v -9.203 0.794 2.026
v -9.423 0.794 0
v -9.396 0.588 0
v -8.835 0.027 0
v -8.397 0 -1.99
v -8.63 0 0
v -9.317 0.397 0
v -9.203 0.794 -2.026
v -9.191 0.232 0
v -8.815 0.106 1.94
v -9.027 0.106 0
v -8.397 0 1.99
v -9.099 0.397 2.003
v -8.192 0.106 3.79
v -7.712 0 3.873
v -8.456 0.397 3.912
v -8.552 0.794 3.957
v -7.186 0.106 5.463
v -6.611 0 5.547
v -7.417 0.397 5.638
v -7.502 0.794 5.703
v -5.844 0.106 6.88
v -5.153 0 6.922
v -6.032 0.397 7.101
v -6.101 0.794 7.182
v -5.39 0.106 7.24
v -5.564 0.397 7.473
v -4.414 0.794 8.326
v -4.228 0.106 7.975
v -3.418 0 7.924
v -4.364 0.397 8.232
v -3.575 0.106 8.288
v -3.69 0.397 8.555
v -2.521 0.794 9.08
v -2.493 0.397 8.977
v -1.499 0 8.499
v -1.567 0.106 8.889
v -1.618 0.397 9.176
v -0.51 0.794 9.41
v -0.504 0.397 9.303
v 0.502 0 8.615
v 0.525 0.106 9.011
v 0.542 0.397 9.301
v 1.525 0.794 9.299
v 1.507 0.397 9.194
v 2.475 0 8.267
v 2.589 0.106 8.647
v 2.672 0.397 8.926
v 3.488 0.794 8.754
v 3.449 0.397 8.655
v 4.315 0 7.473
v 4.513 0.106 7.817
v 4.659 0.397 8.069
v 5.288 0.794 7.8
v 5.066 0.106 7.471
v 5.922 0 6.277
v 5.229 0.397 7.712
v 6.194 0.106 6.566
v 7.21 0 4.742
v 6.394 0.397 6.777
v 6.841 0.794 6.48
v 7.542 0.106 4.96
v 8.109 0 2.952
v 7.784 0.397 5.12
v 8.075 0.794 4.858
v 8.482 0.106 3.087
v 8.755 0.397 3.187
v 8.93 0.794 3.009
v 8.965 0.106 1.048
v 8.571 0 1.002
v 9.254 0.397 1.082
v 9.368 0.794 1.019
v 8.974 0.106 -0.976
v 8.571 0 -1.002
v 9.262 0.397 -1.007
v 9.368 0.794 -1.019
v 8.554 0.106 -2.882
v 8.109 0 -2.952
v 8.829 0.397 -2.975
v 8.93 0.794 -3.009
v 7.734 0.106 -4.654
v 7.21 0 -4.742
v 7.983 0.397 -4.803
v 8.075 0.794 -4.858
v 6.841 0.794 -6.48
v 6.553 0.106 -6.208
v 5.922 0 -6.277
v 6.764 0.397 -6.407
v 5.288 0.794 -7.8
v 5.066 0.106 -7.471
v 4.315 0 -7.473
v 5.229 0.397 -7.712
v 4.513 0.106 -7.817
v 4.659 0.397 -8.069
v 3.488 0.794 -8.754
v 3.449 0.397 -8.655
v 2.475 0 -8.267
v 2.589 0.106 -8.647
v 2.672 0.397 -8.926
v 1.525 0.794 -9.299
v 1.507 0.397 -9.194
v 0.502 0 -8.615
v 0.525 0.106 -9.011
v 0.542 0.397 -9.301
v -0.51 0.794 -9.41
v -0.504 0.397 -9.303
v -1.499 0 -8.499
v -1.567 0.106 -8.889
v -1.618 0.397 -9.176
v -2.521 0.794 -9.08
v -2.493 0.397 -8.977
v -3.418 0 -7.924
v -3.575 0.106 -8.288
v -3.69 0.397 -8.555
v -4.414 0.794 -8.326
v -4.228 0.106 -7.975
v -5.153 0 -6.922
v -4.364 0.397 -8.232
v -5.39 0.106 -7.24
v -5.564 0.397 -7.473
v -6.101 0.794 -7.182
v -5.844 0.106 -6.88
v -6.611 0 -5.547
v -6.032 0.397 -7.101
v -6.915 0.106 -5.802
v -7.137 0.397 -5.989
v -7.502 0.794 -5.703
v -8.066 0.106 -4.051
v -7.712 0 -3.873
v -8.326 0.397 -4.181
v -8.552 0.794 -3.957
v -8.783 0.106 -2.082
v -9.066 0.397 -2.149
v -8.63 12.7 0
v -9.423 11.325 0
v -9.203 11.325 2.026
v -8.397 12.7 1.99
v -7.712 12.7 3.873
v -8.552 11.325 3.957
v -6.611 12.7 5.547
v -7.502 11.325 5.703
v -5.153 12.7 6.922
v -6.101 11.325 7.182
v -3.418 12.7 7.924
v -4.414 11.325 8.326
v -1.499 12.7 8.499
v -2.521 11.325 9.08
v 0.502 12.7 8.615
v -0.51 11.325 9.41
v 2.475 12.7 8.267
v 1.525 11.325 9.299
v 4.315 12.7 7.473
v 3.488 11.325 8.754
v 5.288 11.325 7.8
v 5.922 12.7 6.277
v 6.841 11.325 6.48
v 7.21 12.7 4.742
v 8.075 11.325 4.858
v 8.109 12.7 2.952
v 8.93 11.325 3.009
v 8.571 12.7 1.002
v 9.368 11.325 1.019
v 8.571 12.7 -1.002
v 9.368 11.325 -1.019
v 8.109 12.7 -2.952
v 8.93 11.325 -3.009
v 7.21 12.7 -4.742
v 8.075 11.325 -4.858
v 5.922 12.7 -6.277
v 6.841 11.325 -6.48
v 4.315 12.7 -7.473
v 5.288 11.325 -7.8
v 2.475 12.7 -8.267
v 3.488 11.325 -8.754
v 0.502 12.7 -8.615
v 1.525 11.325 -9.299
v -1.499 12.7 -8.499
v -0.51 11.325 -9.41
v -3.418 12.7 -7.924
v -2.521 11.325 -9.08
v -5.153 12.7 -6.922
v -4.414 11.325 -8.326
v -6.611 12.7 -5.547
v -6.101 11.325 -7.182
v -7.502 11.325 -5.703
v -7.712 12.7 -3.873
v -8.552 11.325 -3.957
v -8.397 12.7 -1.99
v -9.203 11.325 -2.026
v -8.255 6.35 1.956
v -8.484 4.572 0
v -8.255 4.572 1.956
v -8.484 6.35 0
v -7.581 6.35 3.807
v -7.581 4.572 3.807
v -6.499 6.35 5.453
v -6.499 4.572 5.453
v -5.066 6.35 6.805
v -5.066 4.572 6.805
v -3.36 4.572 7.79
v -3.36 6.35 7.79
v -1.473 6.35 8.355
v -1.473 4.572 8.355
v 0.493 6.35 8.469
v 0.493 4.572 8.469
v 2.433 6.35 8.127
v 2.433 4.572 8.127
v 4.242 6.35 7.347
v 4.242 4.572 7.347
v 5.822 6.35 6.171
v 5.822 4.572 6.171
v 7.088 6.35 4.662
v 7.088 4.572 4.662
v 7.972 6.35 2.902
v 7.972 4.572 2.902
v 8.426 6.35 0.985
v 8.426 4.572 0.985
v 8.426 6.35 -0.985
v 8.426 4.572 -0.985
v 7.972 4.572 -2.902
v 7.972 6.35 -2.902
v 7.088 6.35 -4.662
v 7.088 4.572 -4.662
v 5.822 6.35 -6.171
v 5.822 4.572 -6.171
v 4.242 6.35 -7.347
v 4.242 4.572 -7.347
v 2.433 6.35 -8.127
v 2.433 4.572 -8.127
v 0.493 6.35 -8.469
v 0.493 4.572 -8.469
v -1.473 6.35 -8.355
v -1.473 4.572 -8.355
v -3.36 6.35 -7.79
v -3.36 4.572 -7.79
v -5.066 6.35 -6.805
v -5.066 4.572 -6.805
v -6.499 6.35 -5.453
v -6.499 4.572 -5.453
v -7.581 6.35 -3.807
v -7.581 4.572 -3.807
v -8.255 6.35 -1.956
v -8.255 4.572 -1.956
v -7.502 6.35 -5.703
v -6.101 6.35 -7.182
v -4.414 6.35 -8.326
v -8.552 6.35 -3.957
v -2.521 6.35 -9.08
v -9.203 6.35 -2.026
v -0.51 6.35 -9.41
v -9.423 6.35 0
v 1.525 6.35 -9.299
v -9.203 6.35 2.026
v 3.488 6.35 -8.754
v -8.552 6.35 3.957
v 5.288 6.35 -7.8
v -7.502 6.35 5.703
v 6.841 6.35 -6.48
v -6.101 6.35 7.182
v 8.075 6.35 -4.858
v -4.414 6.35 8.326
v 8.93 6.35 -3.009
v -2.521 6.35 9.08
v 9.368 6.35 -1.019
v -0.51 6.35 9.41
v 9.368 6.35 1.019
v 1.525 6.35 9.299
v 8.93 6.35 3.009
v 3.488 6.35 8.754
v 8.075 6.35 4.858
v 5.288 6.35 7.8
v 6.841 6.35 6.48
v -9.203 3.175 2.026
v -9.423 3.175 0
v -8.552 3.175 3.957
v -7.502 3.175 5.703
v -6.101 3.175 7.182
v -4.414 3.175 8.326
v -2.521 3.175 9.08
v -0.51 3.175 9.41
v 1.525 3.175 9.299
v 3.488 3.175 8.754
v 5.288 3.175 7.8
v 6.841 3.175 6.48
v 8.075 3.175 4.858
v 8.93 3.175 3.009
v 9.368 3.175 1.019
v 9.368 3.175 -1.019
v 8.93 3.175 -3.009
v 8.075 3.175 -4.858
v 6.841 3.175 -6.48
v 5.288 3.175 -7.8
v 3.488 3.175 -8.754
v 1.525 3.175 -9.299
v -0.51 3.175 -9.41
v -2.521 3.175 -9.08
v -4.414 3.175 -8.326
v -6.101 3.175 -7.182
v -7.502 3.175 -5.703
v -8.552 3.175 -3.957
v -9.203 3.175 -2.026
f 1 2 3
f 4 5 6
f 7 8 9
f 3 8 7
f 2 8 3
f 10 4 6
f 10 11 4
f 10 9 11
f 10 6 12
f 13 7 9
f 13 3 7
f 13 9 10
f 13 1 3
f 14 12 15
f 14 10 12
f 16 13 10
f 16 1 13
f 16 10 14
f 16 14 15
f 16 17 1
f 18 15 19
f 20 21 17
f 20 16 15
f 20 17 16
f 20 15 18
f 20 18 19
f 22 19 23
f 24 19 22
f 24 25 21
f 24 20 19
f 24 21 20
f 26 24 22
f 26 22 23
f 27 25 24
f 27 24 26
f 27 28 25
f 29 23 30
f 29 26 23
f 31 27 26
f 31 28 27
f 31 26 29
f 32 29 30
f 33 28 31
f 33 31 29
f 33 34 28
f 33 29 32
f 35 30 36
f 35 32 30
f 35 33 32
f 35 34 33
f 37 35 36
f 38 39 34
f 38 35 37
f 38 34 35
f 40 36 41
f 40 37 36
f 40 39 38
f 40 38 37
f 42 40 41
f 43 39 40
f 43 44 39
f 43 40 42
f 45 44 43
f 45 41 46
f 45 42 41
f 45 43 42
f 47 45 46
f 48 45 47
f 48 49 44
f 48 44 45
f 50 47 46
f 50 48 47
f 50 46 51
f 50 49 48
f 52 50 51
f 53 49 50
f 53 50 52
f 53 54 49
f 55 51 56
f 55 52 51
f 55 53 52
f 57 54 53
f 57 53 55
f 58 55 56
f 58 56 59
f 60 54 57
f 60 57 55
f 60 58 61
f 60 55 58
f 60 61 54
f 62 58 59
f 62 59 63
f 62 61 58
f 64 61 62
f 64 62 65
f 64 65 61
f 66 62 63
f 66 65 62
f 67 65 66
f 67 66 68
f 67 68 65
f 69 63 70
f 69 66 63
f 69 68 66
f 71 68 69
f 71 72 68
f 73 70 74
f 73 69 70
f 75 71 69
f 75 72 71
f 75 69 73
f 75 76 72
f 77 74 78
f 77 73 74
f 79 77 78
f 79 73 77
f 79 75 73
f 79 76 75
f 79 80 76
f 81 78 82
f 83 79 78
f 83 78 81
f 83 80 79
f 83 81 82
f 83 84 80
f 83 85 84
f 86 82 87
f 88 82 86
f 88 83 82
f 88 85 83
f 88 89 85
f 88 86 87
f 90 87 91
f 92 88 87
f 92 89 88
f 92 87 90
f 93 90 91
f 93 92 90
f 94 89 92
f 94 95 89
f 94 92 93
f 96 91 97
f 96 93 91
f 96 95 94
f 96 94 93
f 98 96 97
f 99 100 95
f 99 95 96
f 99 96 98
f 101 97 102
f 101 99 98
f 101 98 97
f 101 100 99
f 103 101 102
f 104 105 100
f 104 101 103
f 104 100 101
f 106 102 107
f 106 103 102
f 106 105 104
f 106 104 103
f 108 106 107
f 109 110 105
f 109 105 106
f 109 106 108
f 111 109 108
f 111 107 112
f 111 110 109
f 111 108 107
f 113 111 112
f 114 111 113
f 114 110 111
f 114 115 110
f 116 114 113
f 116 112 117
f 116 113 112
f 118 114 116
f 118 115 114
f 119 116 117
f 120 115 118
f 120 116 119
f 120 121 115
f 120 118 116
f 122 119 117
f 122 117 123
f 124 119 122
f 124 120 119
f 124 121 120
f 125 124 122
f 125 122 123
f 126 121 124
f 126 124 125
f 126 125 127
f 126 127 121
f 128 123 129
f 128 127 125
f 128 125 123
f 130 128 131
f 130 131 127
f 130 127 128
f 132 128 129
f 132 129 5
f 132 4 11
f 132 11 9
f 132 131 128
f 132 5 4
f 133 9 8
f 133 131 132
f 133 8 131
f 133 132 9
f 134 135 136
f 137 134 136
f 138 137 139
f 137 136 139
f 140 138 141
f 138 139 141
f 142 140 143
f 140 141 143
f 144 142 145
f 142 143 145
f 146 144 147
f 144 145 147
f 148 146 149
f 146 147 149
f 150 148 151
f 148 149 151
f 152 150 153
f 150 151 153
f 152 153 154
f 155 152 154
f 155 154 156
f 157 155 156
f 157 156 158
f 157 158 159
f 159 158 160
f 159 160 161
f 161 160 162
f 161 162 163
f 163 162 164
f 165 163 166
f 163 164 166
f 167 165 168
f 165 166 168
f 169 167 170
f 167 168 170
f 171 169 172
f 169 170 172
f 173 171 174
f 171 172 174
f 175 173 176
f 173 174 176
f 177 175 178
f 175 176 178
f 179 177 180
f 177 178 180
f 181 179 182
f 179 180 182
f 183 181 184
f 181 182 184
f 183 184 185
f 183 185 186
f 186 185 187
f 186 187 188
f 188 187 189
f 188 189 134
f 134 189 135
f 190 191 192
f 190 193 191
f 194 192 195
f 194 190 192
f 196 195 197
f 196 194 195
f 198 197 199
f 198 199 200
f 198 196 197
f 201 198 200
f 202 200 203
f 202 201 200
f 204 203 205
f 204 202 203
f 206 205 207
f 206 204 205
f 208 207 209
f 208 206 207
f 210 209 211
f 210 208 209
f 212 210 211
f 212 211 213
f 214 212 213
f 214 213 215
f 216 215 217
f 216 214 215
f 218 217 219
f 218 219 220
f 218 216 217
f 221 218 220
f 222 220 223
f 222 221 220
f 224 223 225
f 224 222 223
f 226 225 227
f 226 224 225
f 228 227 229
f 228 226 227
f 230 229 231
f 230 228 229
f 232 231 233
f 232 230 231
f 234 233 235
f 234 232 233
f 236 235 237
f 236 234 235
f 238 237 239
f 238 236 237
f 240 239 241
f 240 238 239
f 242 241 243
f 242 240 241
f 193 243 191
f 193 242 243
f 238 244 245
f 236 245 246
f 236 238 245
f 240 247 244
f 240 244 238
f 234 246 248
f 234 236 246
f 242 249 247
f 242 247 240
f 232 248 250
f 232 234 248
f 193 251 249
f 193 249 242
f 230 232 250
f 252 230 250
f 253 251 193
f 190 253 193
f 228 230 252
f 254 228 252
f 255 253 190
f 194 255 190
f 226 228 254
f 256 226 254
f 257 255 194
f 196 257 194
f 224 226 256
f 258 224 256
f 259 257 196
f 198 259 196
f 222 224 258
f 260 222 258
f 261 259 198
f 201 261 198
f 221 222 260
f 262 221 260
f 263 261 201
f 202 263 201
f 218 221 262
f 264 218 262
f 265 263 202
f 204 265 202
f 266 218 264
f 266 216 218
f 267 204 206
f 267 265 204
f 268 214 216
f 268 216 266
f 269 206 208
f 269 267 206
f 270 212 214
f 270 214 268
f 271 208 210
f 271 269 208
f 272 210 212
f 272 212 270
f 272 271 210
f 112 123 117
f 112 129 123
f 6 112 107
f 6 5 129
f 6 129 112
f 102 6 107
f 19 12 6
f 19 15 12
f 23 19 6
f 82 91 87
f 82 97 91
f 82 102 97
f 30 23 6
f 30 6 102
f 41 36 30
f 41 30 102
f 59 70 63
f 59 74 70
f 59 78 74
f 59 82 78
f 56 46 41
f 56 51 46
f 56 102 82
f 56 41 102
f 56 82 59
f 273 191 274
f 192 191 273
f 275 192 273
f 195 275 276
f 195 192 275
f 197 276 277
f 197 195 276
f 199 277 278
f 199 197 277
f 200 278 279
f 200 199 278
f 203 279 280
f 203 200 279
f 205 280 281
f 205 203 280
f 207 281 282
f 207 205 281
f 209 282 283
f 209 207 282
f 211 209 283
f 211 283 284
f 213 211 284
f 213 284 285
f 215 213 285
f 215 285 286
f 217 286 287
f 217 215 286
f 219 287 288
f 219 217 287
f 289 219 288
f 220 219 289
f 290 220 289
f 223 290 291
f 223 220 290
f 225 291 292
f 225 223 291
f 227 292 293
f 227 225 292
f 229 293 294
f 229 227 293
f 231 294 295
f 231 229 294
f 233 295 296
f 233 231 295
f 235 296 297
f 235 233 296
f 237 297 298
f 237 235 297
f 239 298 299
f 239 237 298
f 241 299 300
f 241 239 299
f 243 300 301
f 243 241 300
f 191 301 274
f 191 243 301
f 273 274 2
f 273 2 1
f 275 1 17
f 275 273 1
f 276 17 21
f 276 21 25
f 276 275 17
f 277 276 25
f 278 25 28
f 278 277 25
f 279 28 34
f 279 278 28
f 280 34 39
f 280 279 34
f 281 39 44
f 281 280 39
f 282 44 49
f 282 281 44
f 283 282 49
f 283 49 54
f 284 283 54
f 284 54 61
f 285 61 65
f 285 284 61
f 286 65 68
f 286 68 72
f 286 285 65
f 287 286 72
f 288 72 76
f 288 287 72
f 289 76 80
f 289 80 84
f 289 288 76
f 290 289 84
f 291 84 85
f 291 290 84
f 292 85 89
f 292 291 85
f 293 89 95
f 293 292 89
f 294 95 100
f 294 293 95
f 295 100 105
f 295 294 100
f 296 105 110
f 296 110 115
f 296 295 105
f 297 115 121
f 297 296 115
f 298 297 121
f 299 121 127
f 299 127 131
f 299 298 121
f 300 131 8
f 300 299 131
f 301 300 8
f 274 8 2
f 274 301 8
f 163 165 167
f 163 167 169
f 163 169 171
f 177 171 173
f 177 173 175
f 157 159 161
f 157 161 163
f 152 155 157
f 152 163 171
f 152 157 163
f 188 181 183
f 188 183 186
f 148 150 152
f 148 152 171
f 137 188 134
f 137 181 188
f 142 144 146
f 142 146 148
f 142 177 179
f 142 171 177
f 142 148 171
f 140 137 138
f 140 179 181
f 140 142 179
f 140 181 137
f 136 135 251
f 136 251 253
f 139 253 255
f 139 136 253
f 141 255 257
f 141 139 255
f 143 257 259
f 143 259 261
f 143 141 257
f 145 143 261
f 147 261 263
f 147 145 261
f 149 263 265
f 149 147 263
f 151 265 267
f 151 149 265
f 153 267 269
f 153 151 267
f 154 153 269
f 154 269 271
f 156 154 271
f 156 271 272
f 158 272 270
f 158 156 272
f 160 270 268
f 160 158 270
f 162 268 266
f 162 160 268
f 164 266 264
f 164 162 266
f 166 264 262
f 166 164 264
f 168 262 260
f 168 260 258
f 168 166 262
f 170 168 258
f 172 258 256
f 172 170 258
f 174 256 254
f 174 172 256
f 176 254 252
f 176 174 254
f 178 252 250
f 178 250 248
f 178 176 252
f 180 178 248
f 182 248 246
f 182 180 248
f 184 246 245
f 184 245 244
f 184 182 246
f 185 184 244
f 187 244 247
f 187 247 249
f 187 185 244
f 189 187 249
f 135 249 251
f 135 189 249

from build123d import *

# Parameters (mm, degrees)
FILLET1_R      = 0.79375
CHAMFER1_SIZE  = 0.79375
CHAMFER1_SIZE2 = 1.374815329


with BuildPart() as part:
    # Sketch1 → Revolve1 (revolve)
    with BuildSketch(Plane.XY):
        Polygon((0, 0), (-9.4234, 0), (-9.4234, 3.175), (-8.4836, 4.572), (-8.4836, 6.35), (-9.4234, 6.35), (-9.4234, 12.7), (0, 12.7), align=None)
    revolve(axis=Axis((0, 0, 0), (0, 1, 0)))

    # Fillet1
    fillet1_edges = [part.edges().sort_by_distance(p)[0] for p in [
        (9.4234, 0, 0),
    ]]
    fillet(fillet1_edges, radius=FILLET1_R)

    # Chamfer1
    chamfer1_edges = [part.edges().sort_by_distance(p)[0] for p in [
        (9.4234, 12.7, 0),
    ]]
    chamfer1_side = [part.faces().sort_by_distance(p)[0] for p in [
        (0, 12.7, 0),
    ]]
    chamfer(chamfer1_edges, length=CHAMFER1_SIZE, length2=CHAMFER1_SIZE2, reference=chamfer1_side[0])


solid = part.part
